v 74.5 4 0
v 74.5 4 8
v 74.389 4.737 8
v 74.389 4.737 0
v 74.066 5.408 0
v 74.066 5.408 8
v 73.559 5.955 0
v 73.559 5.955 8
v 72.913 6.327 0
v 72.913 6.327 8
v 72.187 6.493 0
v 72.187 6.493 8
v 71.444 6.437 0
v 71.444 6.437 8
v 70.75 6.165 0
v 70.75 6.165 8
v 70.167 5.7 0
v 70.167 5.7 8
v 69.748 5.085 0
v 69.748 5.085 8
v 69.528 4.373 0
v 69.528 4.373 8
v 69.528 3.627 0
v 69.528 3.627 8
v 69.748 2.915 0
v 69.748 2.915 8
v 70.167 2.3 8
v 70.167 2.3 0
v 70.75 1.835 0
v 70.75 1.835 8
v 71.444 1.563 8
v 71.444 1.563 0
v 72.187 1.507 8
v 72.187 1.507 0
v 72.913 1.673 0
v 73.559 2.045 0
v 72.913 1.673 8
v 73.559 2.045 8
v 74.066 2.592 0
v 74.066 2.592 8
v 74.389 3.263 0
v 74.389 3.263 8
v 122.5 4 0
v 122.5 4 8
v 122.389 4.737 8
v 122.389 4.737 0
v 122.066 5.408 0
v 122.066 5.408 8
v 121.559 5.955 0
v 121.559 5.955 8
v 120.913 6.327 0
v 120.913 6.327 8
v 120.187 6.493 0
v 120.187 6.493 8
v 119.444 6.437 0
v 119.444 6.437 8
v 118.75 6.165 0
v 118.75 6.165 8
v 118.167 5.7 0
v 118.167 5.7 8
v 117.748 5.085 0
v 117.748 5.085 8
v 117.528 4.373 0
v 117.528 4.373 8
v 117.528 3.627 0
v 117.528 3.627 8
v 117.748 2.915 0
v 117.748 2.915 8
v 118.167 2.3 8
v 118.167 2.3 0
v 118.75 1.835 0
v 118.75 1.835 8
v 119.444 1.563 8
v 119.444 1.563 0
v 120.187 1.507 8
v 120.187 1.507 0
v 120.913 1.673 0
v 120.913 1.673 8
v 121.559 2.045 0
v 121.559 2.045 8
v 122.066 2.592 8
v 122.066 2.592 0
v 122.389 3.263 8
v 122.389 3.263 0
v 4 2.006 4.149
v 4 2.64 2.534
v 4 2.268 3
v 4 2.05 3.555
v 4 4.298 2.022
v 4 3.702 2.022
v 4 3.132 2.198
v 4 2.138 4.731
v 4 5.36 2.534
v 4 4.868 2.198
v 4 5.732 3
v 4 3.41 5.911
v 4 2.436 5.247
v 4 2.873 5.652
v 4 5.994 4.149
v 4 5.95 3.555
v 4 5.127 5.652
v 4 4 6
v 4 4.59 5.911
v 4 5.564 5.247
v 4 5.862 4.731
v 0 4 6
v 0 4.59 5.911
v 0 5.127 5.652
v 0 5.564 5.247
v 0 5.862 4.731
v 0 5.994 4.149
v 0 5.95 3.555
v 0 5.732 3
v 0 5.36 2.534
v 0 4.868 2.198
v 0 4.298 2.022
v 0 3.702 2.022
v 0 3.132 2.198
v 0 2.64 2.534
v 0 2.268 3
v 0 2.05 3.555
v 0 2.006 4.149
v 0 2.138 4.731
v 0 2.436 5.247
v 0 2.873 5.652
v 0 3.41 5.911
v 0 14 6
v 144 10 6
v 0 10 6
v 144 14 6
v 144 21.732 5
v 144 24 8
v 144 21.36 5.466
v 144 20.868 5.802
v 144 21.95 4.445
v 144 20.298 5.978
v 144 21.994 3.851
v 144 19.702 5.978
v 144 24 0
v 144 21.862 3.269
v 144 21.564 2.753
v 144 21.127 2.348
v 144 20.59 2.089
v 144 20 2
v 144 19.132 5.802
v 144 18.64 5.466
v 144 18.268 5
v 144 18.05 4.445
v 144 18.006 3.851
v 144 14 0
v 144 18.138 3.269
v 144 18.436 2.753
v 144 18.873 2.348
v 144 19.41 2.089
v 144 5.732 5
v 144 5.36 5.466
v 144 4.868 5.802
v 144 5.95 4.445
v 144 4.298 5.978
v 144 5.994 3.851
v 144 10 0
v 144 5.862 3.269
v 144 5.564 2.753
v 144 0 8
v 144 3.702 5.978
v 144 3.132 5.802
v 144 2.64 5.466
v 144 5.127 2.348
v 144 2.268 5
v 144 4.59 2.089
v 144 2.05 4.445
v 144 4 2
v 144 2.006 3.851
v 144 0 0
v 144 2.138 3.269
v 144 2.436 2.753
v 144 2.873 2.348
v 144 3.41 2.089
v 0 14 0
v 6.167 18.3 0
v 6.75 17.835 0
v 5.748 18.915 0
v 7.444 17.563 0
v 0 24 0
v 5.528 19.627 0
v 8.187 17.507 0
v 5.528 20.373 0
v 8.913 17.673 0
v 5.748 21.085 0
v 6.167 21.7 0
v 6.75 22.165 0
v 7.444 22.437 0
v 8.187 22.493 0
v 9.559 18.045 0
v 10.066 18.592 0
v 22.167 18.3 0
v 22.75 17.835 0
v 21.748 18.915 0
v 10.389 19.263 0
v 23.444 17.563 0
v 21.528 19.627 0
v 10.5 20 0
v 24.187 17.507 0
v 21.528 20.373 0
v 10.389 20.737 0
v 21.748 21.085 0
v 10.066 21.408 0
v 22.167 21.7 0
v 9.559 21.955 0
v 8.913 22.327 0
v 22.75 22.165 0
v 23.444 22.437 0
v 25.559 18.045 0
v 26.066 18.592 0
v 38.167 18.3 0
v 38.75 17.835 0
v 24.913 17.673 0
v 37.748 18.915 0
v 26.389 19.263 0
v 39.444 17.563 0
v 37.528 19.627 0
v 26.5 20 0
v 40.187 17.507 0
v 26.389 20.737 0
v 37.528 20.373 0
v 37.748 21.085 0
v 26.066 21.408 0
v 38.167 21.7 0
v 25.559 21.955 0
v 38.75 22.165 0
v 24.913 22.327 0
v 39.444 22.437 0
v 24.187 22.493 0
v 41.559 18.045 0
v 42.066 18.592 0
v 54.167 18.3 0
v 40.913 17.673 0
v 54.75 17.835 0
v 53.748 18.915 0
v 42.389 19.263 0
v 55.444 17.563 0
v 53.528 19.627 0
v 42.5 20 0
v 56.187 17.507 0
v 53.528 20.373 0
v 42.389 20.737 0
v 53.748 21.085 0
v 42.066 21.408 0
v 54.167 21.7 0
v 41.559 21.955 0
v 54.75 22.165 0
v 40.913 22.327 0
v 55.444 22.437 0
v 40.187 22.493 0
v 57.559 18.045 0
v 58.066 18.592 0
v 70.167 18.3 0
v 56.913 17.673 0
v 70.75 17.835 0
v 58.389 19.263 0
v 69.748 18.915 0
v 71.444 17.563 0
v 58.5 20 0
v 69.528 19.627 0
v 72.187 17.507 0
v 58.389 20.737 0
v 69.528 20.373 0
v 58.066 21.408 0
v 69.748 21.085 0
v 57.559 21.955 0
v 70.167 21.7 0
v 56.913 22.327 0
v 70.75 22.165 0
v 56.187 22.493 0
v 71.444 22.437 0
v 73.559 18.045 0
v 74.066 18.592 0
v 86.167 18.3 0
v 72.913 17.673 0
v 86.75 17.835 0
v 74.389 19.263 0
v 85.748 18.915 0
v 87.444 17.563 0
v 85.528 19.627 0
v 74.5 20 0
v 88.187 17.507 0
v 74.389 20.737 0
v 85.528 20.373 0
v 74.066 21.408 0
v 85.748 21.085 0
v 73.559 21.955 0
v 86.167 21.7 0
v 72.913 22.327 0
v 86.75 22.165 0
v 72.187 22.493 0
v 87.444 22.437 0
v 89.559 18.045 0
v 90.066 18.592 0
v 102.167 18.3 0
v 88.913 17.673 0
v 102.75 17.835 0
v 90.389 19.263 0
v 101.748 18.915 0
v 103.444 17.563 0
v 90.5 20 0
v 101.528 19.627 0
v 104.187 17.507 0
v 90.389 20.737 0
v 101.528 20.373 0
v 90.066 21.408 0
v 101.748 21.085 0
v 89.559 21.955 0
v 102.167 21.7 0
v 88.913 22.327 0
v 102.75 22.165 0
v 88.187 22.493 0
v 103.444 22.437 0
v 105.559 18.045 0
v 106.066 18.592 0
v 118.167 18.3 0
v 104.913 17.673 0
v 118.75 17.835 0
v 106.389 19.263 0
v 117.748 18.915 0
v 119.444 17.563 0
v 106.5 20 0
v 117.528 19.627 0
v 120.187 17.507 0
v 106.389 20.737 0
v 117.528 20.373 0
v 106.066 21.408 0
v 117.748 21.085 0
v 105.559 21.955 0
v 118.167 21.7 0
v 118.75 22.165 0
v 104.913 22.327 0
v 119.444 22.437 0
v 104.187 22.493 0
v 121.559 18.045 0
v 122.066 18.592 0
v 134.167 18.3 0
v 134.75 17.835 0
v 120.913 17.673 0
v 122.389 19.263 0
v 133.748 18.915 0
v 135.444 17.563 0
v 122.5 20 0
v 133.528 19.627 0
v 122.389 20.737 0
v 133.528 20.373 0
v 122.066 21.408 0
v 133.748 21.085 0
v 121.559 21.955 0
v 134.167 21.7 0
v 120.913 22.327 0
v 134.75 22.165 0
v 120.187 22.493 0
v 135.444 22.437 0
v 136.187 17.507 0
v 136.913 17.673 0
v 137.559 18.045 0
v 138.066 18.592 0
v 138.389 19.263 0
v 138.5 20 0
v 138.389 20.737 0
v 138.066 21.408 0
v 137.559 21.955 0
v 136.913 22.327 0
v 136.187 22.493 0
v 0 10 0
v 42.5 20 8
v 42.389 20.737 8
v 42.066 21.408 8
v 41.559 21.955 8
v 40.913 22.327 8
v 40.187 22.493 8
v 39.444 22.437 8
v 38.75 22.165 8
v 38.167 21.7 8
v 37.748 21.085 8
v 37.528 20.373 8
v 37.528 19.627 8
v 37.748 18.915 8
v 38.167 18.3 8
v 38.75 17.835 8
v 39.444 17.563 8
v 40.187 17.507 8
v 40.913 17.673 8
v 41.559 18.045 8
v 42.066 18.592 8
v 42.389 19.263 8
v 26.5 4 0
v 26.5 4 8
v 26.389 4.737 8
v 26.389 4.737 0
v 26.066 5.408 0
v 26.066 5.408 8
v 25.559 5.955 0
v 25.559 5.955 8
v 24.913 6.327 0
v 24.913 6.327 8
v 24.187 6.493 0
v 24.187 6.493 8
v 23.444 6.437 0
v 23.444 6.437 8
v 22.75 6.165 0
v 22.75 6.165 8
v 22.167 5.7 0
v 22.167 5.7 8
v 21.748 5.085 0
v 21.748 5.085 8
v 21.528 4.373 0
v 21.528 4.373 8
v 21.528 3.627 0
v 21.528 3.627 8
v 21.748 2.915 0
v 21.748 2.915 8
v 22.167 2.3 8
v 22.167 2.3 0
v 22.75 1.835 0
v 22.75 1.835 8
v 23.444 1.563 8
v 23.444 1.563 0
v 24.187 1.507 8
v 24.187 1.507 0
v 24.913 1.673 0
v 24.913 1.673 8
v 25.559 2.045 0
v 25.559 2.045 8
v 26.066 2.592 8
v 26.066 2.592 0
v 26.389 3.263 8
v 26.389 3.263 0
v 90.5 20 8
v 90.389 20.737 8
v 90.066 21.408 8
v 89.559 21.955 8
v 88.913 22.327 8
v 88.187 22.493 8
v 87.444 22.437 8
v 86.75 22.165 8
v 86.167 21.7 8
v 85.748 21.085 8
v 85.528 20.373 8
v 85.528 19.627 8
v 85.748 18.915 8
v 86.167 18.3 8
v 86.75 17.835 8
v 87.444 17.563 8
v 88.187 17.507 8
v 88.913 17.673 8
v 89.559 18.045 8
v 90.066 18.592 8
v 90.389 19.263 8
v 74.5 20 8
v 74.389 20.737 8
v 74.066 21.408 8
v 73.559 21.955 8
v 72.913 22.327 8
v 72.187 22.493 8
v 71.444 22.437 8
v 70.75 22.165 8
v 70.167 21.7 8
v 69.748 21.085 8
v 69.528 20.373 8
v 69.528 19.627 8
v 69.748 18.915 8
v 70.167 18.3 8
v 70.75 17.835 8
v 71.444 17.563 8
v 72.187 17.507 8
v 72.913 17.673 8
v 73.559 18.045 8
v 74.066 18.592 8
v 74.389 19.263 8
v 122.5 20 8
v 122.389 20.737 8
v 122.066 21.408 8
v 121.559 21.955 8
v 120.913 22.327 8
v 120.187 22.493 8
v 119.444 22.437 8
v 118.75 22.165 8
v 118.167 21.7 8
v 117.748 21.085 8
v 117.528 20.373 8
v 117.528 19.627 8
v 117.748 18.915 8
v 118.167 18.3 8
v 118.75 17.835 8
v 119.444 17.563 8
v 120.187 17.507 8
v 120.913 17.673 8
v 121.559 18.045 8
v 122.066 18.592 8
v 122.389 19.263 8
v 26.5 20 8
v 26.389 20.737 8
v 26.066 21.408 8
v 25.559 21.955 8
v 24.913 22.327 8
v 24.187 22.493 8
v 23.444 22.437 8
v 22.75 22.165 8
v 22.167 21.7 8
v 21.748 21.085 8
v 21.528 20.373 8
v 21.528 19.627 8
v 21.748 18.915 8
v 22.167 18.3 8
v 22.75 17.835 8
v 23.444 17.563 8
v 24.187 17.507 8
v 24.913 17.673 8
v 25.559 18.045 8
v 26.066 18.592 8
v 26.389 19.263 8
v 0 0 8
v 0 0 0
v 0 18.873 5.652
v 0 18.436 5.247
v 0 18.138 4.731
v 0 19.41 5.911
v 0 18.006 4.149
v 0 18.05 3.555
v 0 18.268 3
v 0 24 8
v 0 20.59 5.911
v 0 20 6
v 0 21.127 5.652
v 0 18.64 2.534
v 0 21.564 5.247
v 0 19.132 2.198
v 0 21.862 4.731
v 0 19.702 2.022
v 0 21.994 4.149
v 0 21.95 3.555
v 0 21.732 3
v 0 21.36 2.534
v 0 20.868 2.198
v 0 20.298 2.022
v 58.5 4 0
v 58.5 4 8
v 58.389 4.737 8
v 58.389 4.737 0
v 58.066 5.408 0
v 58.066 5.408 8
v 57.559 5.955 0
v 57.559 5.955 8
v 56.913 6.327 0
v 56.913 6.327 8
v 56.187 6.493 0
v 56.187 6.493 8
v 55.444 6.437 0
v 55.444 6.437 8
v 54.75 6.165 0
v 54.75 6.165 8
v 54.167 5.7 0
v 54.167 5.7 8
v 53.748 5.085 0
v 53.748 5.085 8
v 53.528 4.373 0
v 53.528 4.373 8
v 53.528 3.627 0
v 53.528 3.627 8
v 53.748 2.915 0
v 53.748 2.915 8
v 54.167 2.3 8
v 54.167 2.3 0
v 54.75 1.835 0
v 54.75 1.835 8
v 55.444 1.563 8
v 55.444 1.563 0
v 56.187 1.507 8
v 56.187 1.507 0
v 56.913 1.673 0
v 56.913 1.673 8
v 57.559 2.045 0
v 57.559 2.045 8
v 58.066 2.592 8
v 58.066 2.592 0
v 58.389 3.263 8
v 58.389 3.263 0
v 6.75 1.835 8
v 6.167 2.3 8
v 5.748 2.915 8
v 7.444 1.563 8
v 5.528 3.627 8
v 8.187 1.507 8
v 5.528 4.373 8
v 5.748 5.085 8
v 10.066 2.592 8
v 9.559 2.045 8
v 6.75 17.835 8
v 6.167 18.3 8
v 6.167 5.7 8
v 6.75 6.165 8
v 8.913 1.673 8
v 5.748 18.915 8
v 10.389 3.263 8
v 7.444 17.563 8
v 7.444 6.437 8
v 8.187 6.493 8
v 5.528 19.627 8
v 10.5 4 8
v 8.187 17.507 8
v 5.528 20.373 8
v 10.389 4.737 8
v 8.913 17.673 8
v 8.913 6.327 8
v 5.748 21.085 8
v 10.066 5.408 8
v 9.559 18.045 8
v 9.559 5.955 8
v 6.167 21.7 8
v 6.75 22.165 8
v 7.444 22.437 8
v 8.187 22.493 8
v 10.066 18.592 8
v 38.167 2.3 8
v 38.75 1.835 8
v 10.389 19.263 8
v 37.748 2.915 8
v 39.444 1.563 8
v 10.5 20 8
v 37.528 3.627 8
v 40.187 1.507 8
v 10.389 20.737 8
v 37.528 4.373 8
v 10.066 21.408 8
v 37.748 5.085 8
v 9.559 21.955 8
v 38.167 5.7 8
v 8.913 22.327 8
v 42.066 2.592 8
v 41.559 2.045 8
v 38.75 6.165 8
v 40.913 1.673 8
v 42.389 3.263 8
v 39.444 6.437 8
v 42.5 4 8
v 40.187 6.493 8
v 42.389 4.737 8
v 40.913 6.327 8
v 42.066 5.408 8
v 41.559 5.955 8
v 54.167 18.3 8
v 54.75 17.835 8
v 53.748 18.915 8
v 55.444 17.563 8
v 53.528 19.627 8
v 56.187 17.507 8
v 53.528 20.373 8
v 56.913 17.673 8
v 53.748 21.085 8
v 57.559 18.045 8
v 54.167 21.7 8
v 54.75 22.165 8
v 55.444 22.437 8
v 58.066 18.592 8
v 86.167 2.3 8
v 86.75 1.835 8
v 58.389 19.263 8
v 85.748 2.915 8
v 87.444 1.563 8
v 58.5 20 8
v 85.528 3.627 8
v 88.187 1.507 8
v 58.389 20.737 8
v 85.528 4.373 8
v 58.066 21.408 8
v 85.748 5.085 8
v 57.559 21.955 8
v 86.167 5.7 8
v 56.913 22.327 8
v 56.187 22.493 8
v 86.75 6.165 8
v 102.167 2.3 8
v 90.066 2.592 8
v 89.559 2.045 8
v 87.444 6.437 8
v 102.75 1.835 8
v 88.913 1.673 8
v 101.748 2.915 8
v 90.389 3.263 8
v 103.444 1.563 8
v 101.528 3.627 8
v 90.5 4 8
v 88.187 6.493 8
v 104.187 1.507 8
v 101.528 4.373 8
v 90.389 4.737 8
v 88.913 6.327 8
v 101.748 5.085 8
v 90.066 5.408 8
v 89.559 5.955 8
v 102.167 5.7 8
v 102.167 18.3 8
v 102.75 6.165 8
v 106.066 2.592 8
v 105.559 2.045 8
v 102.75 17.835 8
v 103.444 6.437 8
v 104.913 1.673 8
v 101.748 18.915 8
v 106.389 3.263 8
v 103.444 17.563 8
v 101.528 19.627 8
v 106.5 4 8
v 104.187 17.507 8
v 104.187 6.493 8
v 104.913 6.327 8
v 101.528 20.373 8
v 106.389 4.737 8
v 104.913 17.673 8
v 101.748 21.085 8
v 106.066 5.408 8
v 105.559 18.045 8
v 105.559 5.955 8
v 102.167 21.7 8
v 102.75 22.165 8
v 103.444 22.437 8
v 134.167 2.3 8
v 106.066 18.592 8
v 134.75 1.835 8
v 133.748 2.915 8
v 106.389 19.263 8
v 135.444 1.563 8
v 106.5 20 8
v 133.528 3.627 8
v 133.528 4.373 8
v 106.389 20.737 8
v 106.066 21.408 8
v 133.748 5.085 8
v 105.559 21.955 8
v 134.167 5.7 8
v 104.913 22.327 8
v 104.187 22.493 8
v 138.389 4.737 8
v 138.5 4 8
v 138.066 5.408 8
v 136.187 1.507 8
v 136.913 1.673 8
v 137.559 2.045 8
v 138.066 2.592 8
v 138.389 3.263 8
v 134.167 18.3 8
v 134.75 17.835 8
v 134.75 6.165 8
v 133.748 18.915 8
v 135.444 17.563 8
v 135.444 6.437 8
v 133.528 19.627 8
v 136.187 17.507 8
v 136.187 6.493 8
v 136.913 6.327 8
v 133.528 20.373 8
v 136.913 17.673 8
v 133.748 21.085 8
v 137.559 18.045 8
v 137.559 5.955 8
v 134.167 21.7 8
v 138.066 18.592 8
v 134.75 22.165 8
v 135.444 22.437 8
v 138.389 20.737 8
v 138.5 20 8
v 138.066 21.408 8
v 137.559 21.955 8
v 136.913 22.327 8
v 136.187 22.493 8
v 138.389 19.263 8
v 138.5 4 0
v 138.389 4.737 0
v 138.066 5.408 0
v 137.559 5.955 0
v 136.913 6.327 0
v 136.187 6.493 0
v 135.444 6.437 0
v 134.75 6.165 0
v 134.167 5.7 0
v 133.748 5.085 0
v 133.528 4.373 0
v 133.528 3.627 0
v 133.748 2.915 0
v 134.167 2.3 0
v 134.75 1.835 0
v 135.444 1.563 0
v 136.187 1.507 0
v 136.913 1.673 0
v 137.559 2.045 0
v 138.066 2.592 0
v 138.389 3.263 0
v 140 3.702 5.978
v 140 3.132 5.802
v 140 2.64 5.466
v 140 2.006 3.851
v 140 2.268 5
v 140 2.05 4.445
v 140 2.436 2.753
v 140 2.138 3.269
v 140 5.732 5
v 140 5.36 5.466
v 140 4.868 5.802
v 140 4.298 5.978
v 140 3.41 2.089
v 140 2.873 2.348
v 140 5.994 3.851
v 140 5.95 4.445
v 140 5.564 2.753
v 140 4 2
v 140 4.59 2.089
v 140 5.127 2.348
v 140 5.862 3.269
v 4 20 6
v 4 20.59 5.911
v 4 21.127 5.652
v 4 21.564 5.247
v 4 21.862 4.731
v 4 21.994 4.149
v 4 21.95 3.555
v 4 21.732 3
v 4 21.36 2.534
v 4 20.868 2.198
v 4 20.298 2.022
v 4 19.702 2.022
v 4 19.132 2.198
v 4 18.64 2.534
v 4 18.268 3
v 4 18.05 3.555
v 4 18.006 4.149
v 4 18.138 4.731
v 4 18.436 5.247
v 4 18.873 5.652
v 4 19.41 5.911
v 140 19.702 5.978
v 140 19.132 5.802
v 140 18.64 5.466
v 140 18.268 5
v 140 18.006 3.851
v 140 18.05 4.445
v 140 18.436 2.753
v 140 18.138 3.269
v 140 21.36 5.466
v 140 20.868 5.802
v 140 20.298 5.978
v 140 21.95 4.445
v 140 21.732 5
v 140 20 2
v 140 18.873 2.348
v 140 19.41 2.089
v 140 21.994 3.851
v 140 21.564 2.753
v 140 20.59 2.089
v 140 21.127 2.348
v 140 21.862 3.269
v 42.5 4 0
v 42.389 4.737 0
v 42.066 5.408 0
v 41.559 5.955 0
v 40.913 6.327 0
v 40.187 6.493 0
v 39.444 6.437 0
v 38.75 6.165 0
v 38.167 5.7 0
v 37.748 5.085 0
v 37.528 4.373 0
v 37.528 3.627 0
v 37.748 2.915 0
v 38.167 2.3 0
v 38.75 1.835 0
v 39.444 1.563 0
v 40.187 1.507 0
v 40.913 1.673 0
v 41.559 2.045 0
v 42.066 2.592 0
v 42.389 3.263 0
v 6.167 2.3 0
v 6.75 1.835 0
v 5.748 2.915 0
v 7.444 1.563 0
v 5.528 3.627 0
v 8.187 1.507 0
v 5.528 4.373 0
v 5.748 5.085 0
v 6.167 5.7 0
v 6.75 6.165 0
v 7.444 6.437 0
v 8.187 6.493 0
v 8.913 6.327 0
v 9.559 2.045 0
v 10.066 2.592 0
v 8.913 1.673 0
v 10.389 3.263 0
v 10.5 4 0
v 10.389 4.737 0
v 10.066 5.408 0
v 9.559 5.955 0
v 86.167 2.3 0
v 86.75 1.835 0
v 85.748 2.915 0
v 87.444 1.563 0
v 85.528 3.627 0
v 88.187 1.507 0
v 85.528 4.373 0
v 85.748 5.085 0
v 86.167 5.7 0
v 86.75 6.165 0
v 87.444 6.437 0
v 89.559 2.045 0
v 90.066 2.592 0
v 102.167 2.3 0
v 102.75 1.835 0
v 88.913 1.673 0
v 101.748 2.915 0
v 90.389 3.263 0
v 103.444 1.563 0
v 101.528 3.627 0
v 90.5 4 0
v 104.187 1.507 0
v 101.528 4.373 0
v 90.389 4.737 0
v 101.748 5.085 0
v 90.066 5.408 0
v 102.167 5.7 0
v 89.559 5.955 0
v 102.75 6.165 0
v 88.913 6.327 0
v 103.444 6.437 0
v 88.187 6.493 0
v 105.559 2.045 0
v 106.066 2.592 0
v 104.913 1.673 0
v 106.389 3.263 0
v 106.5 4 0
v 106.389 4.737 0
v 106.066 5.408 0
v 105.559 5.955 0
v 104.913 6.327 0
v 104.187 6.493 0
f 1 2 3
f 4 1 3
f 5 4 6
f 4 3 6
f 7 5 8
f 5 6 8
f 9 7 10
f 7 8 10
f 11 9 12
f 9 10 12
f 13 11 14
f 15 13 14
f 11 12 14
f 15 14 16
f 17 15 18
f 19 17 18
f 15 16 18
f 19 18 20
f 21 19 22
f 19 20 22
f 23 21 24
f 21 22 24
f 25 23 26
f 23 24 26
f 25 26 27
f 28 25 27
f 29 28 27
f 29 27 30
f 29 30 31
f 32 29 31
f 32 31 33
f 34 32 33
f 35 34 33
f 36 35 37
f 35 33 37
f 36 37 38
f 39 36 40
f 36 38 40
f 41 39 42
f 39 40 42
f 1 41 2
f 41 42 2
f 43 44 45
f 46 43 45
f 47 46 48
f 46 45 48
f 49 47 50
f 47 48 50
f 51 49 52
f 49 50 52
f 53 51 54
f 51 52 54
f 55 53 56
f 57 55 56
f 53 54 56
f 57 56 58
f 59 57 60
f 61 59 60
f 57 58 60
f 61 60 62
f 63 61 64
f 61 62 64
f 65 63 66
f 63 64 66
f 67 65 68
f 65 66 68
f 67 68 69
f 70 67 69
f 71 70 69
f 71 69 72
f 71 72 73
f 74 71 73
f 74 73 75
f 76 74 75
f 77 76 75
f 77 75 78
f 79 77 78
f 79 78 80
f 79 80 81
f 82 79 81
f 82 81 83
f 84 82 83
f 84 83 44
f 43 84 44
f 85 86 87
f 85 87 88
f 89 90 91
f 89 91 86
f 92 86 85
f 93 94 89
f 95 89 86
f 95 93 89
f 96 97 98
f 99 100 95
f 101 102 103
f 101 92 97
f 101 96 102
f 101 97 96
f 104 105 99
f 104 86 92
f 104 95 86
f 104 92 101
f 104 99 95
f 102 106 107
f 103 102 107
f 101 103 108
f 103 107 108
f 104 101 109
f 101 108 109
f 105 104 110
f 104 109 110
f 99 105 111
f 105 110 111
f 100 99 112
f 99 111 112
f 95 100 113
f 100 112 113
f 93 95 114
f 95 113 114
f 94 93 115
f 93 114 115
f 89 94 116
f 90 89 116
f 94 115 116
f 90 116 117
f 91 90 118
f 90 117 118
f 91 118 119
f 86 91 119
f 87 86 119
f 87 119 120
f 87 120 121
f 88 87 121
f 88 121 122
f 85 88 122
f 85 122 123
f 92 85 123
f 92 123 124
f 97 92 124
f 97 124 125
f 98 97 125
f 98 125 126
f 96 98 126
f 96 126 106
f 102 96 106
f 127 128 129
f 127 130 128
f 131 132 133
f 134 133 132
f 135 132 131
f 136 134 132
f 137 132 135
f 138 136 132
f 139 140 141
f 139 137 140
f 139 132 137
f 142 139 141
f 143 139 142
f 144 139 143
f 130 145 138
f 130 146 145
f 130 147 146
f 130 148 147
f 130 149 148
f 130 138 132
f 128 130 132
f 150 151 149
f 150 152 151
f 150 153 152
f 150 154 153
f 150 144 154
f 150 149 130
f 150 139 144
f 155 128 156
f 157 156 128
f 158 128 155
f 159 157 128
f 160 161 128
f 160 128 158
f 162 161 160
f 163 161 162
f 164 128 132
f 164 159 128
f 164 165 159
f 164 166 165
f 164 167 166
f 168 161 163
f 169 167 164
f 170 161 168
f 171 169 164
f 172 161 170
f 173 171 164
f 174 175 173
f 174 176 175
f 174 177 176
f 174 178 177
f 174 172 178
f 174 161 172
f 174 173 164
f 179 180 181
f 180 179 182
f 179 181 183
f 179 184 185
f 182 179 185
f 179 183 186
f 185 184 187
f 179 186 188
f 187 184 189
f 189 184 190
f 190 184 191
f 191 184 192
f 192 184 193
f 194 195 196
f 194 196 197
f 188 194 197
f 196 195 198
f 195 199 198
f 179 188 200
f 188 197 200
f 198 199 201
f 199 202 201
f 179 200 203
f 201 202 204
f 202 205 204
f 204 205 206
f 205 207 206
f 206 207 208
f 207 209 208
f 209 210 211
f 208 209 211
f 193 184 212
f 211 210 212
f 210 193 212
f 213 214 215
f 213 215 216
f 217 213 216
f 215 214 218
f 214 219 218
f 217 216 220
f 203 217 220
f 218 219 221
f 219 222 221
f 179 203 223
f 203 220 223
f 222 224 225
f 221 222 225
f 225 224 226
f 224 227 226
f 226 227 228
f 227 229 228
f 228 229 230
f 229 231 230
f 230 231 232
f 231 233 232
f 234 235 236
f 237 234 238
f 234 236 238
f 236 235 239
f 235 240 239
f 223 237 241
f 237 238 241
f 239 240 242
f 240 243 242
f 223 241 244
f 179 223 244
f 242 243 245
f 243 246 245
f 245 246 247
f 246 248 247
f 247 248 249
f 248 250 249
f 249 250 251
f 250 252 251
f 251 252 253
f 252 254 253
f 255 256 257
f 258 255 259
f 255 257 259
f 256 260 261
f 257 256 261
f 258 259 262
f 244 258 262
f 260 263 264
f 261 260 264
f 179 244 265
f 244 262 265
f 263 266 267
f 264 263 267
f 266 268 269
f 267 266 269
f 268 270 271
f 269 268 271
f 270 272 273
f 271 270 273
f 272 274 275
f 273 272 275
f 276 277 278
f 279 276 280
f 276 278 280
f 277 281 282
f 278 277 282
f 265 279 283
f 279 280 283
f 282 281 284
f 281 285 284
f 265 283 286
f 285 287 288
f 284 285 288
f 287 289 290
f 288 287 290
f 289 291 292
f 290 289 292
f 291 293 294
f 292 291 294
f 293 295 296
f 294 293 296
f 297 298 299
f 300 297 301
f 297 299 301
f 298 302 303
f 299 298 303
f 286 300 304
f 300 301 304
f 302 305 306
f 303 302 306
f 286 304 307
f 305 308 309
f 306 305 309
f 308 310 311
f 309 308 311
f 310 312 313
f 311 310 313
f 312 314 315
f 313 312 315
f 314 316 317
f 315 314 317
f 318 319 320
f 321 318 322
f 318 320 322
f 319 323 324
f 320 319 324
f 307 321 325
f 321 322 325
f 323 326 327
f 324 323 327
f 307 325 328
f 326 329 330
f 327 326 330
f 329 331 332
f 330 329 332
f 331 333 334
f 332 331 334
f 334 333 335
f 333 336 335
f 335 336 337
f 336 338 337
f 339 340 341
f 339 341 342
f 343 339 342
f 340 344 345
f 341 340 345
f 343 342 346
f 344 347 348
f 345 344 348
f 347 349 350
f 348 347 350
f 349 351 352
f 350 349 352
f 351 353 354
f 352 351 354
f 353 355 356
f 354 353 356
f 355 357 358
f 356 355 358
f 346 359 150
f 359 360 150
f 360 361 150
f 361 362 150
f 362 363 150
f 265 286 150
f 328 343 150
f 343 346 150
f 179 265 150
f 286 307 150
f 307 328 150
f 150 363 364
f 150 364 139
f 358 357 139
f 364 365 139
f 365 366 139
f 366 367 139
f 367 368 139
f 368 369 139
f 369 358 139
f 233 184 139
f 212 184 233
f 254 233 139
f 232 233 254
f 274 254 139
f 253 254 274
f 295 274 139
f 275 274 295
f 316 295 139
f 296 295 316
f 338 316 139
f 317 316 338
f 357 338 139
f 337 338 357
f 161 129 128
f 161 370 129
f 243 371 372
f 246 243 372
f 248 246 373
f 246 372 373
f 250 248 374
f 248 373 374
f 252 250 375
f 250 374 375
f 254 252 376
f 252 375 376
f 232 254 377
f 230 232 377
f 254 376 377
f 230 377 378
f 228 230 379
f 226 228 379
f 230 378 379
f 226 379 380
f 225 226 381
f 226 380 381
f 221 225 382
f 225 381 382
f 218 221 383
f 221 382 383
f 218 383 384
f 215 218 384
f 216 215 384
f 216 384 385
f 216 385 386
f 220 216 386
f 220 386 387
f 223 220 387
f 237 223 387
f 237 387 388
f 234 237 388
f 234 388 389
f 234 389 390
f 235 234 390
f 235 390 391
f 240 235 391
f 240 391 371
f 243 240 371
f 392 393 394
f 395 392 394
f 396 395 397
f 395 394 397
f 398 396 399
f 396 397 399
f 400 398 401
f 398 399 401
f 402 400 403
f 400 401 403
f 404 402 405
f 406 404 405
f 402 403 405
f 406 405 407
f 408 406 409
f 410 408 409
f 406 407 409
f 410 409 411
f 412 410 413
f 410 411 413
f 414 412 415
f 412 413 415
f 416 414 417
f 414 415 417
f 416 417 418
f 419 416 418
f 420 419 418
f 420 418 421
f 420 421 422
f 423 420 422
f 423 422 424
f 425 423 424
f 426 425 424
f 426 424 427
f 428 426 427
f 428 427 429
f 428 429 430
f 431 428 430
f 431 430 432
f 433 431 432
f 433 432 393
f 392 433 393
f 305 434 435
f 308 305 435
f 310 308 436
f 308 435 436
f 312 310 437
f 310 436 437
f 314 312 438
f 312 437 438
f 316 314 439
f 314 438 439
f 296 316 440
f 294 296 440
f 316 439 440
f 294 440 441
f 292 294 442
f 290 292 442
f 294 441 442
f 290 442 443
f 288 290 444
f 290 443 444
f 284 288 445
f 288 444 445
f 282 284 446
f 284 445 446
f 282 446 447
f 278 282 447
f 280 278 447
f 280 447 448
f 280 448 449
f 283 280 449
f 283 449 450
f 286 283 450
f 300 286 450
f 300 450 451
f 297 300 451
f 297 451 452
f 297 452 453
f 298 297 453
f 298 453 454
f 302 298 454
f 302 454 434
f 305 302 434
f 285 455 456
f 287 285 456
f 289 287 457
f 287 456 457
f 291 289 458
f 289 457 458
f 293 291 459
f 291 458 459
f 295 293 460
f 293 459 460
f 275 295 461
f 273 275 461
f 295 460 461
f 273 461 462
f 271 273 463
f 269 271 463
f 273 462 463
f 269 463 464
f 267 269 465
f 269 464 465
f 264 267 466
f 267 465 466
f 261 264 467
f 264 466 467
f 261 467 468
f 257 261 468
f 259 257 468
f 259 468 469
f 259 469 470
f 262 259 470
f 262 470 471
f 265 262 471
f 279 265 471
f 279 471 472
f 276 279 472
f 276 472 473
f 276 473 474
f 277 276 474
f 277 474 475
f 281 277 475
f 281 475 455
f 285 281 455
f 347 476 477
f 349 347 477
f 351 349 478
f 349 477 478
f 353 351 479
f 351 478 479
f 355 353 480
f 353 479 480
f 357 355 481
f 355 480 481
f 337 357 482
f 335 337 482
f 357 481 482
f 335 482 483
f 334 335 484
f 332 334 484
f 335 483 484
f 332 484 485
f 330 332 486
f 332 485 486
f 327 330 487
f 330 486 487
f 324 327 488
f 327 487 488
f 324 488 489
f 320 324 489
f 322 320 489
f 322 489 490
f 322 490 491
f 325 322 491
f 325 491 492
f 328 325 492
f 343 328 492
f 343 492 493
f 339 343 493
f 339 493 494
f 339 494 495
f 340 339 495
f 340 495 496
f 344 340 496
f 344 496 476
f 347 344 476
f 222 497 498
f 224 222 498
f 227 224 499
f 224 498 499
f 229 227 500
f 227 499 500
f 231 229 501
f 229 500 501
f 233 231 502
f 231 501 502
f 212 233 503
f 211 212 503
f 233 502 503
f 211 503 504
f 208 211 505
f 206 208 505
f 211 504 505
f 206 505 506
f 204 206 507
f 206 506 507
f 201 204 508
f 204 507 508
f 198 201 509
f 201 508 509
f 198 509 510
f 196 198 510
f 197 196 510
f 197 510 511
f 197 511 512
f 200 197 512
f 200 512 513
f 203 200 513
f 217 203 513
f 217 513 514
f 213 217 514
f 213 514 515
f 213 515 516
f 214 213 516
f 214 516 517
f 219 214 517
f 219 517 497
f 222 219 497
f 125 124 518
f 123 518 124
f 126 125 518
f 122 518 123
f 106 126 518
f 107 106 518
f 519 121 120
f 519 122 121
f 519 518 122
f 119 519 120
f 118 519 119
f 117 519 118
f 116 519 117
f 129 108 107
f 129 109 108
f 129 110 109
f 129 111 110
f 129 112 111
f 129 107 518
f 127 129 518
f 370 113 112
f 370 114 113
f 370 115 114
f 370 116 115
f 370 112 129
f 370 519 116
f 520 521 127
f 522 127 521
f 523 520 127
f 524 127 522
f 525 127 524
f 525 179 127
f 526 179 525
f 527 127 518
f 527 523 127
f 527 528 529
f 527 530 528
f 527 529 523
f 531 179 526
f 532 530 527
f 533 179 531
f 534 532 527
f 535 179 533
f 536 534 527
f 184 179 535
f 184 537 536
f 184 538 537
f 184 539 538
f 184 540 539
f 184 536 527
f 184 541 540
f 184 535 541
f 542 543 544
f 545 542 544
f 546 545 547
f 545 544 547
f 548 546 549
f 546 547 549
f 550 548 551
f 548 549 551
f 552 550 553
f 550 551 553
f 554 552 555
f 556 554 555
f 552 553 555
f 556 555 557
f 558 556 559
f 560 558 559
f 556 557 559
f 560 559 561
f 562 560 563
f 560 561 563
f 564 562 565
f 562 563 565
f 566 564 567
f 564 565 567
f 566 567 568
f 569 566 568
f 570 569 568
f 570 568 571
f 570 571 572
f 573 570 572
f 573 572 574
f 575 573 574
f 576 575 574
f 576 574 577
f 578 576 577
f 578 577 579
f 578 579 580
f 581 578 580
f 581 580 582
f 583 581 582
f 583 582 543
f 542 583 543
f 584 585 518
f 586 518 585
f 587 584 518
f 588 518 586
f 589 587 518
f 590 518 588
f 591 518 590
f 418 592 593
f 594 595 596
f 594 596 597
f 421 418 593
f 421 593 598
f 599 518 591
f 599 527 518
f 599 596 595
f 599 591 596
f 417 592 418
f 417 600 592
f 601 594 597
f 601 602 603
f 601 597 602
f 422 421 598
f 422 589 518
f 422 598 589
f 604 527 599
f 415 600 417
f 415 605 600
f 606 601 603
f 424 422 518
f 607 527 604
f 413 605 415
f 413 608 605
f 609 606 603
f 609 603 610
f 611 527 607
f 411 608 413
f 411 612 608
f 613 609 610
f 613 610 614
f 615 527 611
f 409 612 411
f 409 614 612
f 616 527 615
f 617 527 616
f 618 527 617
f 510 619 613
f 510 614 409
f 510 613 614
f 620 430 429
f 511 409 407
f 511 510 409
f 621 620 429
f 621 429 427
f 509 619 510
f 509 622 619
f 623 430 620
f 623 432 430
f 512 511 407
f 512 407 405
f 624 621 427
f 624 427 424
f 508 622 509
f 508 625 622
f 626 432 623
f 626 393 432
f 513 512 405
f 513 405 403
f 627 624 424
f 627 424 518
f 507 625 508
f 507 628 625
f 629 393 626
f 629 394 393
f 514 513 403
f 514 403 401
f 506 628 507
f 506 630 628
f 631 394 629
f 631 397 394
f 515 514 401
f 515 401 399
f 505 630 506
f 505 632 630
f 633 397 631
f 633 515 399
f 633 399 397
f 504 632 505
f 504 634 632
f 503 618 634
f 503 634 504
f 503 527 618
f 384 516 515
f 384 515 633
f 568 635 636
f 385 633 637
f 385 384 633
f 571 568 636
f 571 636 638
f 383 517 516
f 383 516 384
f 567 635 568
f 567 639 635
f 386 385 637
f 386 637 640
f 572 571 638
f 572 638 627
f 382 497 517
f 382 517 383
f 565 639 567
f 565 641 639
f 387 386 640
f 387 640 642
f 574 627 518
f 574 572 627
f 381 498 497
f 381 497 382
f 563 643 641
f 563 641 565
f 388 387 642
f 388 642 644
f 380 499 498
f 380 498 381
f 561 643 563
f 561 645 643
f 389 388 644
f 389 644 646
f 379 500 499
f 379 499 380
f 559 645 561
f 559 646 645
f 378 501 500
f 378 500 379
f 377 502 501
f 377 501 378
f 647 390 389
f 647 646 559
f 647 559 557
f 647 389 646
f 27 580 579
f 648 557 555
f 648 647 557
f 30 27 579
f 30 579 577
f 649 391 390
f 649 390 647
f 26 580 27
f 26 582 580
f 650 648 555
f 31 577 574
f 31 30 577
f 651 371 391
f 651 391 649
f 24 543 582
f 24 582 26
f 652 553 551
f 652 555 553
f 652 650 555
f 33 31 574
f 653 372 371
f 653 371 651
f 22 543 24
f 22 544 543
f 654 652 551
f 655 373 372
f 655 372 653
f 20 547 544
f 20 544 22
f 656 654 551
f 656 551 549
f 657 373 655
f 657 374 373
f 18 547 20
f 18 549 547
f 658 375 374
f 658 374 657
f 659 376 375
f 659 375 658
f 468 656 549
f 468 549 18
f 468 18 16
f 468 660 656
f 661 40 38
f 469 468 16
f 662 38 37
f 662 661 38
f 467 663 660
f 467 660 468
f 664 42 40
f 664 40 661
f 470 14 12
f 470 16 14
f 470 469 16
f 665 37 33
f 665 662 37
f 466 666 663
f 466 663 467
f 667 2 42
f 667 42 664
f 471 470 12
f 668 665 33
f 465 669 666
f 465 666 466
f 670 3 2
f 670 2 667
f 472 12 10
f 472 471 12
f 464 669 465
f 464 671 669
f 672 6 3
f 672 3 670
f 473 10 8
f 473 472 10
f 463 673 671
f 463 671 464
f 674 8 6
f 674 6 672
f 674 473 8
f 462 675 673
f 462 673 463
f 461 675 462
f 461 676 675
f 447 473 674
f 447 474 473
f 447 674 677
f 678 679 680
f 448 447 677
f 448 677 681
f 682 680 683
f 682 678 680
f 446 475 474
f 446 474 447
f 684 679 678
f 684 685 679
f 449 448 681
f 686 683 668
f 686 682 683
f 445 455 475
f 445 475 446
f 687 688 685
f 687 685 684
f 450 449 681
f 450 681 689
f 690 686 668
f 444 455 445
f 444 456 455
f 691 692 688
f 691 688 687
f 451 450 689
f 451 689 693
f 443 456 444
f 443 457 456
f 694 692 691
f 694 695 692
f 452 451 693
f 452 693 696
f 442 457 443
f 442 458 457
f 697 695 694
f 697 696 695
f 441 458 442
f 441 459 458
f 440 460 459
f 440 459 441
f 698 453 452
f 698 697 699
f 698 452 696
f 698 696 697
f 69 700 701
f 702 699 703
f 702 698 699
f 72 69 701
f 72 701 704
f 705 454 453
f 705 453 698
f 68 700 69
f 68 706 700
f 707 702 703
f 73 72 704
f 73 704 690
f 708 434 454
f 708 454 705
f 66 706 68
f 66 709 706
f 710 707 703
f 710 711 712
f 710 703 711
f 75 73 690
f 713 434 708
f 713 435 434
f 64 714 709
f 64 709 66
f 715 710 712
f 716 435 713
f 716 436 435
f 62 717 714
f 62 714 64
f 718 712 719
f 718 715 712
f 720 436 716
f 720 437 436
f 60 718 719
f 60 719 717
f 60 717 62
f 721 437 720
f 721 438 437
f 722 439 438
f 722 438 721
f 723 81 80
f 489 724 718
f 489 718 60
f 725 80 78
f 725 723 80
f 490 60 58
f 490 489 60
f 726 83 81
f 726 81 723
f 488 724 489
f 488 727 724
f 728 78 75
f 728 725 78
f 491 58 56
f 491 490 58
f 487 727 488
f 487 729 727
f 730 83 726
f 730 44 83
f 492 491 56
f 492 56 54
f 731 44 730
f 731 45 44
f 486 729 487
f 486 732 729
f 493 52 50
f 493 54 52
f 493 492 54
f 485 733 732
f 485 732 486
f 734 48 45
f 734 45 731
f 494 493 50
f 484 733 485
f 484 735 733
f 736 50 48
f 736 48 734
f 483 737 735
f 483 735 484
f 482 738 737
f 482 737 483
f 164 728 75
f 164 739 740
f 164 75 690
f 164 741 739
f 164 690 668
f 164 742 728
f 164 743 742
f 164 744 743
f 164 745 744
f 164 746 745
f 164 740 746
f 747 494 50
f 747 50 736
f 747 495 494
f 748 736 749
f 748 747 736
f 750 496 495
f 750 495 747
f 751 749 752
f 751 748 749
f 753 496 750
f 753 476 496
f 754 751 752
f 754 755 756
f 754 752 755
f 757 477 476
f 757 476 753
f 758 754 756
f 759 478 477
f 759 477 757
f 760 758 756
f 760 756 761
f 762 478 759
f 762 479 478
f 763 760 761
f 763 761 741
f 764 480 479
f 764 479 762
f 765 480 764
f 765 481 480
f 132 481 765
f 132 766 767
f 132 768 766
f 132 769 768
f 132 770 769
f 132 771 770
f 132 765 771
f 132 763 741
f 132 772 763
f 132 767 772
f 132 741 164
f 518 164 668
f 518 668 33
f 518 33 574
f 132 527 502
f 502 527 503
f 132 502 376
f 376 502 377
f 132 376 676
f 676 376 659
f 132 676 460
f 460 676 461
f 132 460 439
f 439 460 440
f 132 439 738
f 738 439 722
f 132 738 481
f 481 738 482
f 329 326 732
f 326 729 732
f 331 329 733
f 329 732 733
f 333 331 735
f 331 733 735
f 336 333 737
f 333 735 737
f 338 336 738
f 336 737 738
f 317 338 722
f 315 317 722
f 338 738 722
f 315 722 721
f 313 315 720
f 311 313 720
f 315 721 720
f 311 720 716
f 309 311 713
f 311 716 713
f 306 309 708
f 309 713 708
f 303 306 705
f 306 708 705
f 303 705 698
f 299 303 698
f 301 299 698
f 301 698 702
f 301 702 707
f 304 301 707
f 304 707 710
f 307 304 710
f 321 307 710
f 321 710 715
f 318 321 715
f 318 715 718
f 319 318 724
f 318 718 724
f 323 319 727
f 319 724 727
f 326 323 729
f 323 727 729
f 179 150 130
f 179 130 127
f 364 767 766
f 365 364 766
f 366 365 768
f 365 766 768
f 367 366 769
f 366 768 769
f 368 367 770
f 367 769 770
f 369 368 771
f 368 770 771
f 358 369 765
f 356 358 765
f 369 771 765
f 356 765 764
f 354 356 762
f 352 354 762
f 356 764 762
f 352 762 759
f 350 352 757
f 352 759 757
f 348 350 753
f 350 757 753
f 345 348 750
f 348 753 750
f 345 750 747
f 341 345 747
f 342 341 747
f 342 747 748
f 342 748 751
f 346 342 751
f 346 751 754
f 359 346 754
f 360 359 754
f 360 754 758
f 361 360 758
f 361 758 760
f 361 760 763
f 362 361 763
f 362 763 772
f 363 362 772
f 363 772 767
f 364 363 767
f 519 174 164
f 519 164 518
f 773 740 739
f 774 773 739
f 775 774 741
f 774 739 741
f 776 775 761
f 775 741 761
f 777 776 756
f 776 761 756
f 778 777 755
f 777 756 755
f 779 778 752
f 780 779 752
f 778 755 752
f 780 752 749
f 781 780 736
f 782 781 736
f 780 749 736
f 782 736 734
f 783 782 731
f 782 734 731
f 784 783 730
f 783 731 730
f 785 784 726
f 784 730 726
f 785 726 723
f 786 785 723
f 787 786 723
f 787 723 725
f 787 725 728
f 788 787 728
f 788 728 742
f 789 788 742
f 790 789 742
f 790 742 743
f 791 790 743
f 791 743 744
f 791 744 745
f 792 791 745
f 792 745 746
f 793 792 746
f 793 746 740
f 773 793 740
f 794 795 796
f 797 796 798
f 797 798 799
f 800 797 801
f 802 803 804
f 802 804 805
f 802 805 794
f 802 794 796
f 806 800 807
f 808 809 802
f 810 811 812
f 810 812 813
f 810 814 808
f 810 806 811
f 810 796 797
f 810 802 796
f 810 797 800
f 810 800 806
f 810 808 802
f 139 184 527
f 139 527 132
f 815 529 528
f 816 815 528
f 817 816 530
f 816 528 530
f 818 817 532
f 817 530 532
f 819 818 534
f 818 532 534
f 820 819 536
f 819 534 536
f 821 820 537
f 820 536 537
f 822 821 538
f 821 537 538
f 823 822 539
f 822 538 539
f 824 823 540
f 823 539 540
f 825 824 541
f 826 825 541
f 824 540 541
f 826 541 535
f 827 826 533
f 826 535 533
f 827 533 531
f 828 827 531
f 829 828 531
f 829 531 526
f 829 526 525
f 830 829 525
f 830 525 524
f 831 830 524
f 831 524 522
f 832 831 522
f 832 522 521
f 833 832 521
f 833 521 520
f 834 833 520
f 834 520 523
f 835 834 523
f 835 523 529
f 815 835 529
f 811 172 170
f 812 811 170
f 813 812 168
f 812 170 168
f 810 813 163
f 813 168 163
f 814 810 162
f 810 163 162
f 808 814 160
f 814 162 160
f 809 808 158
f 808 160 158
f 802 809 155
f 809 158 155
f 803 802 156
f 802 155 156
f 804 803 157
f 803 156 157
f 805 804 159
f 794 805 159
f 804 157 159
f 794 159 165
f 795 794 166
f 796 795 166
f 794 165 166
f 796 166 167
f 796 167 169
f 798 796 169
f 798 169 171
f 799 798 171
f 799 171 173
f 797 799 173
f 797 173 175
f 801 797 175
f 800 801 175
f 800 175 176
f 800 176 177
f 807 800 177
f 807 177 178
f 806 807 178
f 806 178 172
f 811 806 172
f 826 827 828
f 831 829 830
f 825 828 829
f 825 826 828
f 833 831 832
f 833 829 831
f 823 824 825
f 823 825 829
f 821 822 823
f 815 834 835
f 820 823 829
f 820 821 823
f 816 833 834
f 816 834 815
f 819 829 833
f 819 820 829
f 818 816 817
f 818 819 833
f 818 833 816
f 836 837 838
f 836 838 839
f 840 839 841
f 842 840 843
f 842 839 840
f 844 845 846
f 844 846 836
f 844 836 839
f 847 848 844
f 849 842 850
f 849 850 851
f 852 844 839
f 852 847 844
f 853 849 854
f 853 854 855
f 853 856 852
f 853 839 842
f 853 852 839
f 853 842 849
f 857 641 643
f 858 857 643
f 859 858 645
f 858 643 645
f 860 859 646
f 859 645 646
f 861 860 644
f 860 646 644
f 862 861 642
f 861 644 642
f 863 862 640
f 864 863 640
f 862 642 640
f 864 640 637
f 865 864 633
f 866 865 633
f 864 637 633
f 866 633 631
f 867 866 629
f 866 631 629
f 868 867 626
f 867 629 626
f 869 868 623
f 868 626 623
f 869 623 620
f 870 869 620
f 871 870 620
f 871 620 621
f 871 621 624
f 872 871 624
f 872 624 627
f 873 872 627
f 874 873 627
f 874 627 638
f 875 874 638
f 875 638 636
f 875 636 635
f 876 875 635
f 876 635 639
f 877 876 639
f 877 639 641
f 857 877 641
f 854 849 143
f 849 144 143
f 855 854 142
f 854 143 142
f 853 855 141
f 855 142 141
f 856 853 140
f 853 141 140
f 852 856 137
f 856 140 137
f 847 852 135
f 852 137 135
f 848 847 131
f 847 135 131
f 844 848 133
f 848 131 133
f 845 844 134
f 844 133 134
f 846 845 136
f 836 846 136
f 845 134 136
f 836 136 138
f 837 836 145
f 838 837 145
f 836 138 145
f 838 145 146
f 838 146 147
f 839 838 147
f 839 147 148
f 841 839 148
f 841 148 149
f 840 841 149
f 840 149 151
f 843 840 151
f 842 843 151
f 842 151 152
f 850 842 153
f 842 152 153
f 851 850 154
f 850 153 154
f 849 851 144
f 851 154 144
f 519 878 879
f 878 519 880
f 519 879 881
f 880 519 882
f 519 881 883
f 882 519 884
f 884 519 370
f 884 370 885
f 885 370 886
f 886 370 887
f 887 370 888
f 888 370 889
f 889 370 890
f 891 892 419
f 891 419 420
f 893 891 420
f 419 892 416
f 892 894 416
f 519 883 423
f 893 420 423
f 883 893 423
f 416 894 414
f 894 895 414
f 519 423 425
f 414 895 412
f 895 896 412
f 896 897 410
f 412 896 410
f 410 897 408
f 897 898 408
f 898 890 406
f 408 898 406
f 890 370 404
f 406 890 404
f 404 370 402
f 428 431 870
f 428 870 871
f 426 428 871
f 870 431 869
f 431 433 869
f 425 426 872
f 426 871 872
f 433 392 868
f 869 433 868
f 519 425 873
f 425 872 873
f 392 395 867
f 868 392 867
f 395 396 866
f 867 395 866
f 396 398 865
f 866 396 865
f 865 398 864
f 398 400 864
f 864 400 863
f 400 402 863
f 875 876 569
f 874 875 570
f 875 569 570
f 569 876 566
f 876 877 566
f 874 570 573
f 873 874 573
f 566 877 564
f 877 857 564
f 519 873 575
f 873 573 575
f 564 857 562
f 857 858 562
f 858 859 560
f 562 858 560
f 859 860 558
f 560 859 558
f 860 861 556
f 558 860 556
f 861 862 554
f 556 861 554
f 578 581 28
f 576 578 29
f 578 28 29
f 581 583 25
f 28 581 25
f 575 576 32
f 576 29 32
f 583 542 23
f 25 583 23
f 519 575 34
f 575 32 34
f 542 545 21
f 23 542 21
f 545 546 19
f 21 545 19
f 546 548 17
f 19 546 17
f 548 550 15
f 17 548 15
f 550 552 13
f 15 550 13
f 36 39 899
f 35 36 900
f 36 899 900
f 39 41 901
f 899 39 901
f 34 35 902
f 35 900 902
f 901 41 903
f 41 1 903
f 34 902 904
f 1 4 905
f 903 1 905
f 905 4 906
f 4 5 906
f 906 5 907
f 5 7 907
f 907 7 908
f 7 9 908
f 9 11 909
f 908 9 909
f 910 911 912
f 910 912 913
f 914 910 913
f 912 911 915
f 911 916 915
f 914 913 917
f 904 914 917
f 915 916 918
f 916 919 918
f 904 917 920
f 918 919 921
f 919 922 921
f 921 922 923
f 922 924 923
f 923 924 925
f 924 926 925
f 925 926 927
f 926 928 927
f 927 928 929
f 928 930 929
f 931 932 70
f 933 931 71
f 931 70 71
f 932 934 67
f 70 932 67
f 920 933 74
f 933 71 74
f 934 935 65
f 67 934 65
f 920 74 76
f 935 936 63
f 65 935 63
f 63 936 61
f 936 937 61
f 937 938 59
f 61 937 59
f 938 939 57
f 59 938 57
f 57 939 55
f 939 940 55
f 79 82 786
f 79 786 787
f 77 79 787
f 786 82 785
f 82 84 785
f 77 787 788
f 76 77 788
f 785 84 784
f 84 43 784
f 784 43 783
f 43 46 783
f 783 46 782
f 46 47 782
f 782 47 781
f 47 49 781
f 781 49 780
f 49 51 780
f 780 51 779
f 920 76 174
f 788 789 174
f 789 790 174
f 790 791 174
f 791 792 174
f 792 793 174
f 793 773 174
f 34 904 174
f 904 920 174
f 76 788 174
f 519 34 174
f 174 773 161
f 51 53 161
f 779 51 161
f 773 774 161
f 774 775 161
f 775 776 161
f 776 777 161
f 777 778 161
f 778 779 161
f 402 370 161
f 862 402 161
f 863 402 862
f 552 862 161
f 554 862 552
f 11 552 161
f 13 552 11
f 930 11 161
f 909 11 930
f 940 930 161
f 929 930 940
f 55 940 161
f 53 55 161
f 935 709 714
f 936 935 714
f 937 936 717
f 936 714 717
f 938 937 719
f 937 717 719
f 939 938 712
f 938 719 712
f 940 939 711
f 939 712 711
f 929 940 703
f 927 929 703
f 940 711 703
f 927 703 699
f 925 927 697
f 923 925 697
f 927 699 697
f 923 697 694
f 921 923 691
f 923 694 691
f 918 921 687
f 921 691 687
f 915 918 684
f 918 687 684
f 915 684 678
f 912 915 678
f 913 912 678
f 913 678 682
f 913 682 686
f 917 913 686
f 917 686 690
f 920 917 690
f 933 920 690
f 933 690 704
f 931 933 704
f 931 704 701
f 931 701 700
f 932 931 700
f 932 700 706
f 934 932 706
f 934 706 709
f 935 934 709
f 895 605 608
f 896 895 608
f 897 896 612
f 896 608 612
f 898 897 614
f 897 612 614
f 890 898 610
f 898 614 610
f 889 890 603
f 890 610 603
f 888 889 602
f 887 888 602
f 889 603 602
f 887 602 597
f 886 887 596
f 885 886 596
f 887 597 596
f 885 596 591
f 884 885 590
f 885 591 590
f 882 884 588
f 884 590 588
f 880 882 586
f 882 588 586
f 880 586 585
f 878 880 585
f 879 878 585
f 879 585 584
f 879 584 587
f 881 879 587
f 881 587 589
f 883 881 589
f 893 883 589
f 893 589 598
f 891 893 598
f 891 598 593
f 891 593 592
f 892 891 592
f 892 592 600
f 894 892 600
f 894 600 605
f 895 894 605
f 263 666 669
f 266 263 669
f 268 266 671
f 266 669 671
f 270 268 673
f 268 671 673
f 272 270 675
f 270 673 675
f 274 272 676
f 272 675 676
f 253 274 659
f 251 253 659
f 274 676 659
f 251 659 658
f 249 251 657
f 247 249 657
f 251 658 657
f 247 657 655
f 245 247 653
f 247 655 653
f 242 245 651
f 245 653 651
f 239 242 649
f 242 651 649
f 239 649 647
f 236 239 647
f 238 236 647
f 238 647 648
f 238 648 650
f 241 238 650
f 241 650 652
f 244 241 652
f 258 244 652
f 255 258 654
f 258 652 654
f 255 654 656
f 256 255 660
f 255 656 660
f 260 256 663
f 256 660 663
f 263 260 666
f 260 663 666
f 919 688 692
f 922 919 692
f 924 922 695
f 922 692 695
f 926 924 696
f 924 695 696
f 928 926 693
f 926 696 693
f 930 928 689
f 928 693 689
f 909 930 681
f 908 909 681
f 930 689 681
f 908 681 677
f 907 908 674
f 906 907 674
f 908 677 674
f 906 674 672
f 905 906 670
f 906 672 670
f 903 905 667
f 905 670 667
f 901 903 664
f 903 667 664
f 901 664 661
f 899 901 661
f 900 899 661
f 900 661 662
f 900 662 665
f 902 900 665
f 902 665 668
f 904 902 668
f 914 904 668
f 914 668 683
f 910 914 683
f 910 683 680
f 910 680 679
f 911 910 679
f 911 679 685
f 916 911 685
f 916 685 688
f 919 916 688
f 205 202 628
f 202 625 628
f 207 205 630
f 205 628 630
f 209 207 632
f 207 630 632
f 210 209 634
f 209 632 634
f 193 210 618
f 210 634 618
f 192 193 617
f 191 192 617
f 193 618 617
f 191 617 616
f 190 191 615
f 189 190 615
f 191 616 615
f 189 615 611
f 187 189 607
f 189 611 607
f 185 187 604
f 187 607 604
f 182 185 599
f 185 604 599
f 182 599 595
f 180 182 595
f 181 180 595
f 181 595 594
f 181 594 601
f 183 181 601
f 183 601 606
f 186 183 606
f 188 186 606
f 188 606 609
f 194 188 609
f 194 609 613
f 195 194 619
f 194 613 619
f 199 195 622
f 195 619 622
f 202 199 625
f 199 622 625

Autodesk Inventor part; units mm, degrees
ref_plane "YZ Plane" through (0, 0, 0) normal (1, 0, 0) x (0, 1, 0)
ref_plane "XZ Plane" through (0, 0, 0) normal (0, 1, 0) x (-1, 0, 0)
ref_plane "XY Plane" through (0, 0, 0) normal (0, 0, 1) x (1, 0, 0)
sketch "Sketch1" plane through (0, 0, 0) normal (0, 0, 1) x (1, 0, 0)
  line L0 (144, 0) -> (0, 0)
  line L1 (0, 0) -> (0, 24)
  line L2 (0, 24) -> (144, 24)
  line L3 (144, 24) -> (144, 0)
  point P0 (0, 0)
  dimension "d0" = 144
  dimension "d1" = 24
extrude "Extrusion1" add sketch "Sketch1" along normal blind 8
sketch "Sketch5" plane through (0, 0, 8) normal (0, 0, 1) x (1, 0, 0)
  circle A0 centre (136, 20) radius 2.5
  line L0 (144, 20) -> (0, 20) construction
  line L1 (136, 24) -> (136, 0) construction
  line L2 (144, 24) -> (0, 24) construction
  line L3 (0, 0) -> (144, 0) construction
  line L4 (0, 24) -> (144, 24) construction
  line L5 (144, 24) -> (144, 0) construction
  line L6 (144, 0) -> (0, 0) construction
  line L7 (0, 0) -> (0, 24) construction
  circle A1 centre (120, 20) radius 2.5
  circle A2 centre (104, 20) radius 2.5
  circle A3 centre (88, 20) radius 2.5
  circle A4 centre (72, 20) radius 2.5
  circle A5 centre (56, 20) radius 2.5
  circle A6 centre (40, 20) radius 2.5
  circle A7 centre (24, 20) radius 2.5
  circle A8 centre (8, 20) radius 2.5
  circle A9 centre (136, 4) radius 2.5
  circle A10 centre (120, 4) radius 2.5
  circle A11 centre (104, 4) radius 2.5
  circle A12 centre (88, 4) radius 2.5
  circle A13 centre (72, 4) radius 2.5
  circle A14 centre (56, 4) radius 2.5
  circle A15 centre (40, 4) radius 2.5
  circle A16 centre (24, 4) radius 2.5
  circle A17 centre (8, 4) radius 2.5
  dimension "d30" = 5
  dimension "d83" = 4
  dimension "d84" = 8
  dimension "d87" = 16
  dimension "d90" = 16
extrude "Extrusion8" cut sketch "Sketch5" against normal through all
sketch "Sketch9" plane through (144, 0, 0) normal (1, 0, 0) x (0, 0, -1)
  circle A0 centre (-4, 20) radius 2
  circle A1 centre (-4, 4) radius 2
  line L0 (0, 0) -> (-8, 0) projected
  line L1 (0, 24) -> (-8, 24) construction
  line L2 (-8, 24) -> (0, 24) construction
  line L3 (0, 24) -> (0, 0) construction
  line L4 (0, 0) -> (-8, 0) construction
  line L5 (-8, 0) -> (-8, 24) construction
  point P0 (0, 0)
  dimension "d95" = 4
  dimension "d96" = 4
  dimension "d97" = 4
  dimension "d98" = 4
  dimension "d99" = 4
  dimension "d100" = 4
extrude "Extrusion9" cut sketch "Sketch9" against normal blind 4
sketch "Sketch10" plane through (0, 0, 0) normal (-1, 0, 0) x (0, 0, 1)
  line L0 (0, 24) -> (0, 0) construction
  line L1 (0, 24) -> (8, 24) construction
  line L2 (8, 24) -> (8, 0) construction
  line L3 (8, 0) -> (0, 0) construction
  line L4 (0, 0) -> (0, 24) construction
  circle A0 centre (4, 20) radius 2
  circle A1 centre (4, 4) radius 2
  point P0 (0, 0)
  dimension "d107" = 4
  dimension "d108" = 4
  dimension "d109" = 4
  dimension "d110" = 4
  dimension "d111" = 4
  dimension "d112" = 4
extrude "Extrusion10" cut sketch "Sketch10" against normal blind 4
sketch "Sketch11" plane through (0, 0, 0) normal (0, 0, -1) x (-1, 0, 0)
  line L0 (-144, 24) -> (-144, 0) projected
  line L1 (-144, 14) -> (0, 14)
  line L2 (0, 14) -> (0, 10)
  line L3 (0, 10) -> (-144, 10)
  line L4 (-144, 10) -> (-144, 14)
  line L5 (0, 24) -> (-144, 24) projected
  line L6 (-144, 0) -> (0, 0) projected
  point P0 (0, 0)
  dimension "d119" = 10
  dimension "d120" = 10
  dimension "d121" = 144
extrude "Extrusion11" cut sketch "Sketch11" against normal blind 6
properties part number "Beam0824-144-Blue" material "Aluminum 6061"
